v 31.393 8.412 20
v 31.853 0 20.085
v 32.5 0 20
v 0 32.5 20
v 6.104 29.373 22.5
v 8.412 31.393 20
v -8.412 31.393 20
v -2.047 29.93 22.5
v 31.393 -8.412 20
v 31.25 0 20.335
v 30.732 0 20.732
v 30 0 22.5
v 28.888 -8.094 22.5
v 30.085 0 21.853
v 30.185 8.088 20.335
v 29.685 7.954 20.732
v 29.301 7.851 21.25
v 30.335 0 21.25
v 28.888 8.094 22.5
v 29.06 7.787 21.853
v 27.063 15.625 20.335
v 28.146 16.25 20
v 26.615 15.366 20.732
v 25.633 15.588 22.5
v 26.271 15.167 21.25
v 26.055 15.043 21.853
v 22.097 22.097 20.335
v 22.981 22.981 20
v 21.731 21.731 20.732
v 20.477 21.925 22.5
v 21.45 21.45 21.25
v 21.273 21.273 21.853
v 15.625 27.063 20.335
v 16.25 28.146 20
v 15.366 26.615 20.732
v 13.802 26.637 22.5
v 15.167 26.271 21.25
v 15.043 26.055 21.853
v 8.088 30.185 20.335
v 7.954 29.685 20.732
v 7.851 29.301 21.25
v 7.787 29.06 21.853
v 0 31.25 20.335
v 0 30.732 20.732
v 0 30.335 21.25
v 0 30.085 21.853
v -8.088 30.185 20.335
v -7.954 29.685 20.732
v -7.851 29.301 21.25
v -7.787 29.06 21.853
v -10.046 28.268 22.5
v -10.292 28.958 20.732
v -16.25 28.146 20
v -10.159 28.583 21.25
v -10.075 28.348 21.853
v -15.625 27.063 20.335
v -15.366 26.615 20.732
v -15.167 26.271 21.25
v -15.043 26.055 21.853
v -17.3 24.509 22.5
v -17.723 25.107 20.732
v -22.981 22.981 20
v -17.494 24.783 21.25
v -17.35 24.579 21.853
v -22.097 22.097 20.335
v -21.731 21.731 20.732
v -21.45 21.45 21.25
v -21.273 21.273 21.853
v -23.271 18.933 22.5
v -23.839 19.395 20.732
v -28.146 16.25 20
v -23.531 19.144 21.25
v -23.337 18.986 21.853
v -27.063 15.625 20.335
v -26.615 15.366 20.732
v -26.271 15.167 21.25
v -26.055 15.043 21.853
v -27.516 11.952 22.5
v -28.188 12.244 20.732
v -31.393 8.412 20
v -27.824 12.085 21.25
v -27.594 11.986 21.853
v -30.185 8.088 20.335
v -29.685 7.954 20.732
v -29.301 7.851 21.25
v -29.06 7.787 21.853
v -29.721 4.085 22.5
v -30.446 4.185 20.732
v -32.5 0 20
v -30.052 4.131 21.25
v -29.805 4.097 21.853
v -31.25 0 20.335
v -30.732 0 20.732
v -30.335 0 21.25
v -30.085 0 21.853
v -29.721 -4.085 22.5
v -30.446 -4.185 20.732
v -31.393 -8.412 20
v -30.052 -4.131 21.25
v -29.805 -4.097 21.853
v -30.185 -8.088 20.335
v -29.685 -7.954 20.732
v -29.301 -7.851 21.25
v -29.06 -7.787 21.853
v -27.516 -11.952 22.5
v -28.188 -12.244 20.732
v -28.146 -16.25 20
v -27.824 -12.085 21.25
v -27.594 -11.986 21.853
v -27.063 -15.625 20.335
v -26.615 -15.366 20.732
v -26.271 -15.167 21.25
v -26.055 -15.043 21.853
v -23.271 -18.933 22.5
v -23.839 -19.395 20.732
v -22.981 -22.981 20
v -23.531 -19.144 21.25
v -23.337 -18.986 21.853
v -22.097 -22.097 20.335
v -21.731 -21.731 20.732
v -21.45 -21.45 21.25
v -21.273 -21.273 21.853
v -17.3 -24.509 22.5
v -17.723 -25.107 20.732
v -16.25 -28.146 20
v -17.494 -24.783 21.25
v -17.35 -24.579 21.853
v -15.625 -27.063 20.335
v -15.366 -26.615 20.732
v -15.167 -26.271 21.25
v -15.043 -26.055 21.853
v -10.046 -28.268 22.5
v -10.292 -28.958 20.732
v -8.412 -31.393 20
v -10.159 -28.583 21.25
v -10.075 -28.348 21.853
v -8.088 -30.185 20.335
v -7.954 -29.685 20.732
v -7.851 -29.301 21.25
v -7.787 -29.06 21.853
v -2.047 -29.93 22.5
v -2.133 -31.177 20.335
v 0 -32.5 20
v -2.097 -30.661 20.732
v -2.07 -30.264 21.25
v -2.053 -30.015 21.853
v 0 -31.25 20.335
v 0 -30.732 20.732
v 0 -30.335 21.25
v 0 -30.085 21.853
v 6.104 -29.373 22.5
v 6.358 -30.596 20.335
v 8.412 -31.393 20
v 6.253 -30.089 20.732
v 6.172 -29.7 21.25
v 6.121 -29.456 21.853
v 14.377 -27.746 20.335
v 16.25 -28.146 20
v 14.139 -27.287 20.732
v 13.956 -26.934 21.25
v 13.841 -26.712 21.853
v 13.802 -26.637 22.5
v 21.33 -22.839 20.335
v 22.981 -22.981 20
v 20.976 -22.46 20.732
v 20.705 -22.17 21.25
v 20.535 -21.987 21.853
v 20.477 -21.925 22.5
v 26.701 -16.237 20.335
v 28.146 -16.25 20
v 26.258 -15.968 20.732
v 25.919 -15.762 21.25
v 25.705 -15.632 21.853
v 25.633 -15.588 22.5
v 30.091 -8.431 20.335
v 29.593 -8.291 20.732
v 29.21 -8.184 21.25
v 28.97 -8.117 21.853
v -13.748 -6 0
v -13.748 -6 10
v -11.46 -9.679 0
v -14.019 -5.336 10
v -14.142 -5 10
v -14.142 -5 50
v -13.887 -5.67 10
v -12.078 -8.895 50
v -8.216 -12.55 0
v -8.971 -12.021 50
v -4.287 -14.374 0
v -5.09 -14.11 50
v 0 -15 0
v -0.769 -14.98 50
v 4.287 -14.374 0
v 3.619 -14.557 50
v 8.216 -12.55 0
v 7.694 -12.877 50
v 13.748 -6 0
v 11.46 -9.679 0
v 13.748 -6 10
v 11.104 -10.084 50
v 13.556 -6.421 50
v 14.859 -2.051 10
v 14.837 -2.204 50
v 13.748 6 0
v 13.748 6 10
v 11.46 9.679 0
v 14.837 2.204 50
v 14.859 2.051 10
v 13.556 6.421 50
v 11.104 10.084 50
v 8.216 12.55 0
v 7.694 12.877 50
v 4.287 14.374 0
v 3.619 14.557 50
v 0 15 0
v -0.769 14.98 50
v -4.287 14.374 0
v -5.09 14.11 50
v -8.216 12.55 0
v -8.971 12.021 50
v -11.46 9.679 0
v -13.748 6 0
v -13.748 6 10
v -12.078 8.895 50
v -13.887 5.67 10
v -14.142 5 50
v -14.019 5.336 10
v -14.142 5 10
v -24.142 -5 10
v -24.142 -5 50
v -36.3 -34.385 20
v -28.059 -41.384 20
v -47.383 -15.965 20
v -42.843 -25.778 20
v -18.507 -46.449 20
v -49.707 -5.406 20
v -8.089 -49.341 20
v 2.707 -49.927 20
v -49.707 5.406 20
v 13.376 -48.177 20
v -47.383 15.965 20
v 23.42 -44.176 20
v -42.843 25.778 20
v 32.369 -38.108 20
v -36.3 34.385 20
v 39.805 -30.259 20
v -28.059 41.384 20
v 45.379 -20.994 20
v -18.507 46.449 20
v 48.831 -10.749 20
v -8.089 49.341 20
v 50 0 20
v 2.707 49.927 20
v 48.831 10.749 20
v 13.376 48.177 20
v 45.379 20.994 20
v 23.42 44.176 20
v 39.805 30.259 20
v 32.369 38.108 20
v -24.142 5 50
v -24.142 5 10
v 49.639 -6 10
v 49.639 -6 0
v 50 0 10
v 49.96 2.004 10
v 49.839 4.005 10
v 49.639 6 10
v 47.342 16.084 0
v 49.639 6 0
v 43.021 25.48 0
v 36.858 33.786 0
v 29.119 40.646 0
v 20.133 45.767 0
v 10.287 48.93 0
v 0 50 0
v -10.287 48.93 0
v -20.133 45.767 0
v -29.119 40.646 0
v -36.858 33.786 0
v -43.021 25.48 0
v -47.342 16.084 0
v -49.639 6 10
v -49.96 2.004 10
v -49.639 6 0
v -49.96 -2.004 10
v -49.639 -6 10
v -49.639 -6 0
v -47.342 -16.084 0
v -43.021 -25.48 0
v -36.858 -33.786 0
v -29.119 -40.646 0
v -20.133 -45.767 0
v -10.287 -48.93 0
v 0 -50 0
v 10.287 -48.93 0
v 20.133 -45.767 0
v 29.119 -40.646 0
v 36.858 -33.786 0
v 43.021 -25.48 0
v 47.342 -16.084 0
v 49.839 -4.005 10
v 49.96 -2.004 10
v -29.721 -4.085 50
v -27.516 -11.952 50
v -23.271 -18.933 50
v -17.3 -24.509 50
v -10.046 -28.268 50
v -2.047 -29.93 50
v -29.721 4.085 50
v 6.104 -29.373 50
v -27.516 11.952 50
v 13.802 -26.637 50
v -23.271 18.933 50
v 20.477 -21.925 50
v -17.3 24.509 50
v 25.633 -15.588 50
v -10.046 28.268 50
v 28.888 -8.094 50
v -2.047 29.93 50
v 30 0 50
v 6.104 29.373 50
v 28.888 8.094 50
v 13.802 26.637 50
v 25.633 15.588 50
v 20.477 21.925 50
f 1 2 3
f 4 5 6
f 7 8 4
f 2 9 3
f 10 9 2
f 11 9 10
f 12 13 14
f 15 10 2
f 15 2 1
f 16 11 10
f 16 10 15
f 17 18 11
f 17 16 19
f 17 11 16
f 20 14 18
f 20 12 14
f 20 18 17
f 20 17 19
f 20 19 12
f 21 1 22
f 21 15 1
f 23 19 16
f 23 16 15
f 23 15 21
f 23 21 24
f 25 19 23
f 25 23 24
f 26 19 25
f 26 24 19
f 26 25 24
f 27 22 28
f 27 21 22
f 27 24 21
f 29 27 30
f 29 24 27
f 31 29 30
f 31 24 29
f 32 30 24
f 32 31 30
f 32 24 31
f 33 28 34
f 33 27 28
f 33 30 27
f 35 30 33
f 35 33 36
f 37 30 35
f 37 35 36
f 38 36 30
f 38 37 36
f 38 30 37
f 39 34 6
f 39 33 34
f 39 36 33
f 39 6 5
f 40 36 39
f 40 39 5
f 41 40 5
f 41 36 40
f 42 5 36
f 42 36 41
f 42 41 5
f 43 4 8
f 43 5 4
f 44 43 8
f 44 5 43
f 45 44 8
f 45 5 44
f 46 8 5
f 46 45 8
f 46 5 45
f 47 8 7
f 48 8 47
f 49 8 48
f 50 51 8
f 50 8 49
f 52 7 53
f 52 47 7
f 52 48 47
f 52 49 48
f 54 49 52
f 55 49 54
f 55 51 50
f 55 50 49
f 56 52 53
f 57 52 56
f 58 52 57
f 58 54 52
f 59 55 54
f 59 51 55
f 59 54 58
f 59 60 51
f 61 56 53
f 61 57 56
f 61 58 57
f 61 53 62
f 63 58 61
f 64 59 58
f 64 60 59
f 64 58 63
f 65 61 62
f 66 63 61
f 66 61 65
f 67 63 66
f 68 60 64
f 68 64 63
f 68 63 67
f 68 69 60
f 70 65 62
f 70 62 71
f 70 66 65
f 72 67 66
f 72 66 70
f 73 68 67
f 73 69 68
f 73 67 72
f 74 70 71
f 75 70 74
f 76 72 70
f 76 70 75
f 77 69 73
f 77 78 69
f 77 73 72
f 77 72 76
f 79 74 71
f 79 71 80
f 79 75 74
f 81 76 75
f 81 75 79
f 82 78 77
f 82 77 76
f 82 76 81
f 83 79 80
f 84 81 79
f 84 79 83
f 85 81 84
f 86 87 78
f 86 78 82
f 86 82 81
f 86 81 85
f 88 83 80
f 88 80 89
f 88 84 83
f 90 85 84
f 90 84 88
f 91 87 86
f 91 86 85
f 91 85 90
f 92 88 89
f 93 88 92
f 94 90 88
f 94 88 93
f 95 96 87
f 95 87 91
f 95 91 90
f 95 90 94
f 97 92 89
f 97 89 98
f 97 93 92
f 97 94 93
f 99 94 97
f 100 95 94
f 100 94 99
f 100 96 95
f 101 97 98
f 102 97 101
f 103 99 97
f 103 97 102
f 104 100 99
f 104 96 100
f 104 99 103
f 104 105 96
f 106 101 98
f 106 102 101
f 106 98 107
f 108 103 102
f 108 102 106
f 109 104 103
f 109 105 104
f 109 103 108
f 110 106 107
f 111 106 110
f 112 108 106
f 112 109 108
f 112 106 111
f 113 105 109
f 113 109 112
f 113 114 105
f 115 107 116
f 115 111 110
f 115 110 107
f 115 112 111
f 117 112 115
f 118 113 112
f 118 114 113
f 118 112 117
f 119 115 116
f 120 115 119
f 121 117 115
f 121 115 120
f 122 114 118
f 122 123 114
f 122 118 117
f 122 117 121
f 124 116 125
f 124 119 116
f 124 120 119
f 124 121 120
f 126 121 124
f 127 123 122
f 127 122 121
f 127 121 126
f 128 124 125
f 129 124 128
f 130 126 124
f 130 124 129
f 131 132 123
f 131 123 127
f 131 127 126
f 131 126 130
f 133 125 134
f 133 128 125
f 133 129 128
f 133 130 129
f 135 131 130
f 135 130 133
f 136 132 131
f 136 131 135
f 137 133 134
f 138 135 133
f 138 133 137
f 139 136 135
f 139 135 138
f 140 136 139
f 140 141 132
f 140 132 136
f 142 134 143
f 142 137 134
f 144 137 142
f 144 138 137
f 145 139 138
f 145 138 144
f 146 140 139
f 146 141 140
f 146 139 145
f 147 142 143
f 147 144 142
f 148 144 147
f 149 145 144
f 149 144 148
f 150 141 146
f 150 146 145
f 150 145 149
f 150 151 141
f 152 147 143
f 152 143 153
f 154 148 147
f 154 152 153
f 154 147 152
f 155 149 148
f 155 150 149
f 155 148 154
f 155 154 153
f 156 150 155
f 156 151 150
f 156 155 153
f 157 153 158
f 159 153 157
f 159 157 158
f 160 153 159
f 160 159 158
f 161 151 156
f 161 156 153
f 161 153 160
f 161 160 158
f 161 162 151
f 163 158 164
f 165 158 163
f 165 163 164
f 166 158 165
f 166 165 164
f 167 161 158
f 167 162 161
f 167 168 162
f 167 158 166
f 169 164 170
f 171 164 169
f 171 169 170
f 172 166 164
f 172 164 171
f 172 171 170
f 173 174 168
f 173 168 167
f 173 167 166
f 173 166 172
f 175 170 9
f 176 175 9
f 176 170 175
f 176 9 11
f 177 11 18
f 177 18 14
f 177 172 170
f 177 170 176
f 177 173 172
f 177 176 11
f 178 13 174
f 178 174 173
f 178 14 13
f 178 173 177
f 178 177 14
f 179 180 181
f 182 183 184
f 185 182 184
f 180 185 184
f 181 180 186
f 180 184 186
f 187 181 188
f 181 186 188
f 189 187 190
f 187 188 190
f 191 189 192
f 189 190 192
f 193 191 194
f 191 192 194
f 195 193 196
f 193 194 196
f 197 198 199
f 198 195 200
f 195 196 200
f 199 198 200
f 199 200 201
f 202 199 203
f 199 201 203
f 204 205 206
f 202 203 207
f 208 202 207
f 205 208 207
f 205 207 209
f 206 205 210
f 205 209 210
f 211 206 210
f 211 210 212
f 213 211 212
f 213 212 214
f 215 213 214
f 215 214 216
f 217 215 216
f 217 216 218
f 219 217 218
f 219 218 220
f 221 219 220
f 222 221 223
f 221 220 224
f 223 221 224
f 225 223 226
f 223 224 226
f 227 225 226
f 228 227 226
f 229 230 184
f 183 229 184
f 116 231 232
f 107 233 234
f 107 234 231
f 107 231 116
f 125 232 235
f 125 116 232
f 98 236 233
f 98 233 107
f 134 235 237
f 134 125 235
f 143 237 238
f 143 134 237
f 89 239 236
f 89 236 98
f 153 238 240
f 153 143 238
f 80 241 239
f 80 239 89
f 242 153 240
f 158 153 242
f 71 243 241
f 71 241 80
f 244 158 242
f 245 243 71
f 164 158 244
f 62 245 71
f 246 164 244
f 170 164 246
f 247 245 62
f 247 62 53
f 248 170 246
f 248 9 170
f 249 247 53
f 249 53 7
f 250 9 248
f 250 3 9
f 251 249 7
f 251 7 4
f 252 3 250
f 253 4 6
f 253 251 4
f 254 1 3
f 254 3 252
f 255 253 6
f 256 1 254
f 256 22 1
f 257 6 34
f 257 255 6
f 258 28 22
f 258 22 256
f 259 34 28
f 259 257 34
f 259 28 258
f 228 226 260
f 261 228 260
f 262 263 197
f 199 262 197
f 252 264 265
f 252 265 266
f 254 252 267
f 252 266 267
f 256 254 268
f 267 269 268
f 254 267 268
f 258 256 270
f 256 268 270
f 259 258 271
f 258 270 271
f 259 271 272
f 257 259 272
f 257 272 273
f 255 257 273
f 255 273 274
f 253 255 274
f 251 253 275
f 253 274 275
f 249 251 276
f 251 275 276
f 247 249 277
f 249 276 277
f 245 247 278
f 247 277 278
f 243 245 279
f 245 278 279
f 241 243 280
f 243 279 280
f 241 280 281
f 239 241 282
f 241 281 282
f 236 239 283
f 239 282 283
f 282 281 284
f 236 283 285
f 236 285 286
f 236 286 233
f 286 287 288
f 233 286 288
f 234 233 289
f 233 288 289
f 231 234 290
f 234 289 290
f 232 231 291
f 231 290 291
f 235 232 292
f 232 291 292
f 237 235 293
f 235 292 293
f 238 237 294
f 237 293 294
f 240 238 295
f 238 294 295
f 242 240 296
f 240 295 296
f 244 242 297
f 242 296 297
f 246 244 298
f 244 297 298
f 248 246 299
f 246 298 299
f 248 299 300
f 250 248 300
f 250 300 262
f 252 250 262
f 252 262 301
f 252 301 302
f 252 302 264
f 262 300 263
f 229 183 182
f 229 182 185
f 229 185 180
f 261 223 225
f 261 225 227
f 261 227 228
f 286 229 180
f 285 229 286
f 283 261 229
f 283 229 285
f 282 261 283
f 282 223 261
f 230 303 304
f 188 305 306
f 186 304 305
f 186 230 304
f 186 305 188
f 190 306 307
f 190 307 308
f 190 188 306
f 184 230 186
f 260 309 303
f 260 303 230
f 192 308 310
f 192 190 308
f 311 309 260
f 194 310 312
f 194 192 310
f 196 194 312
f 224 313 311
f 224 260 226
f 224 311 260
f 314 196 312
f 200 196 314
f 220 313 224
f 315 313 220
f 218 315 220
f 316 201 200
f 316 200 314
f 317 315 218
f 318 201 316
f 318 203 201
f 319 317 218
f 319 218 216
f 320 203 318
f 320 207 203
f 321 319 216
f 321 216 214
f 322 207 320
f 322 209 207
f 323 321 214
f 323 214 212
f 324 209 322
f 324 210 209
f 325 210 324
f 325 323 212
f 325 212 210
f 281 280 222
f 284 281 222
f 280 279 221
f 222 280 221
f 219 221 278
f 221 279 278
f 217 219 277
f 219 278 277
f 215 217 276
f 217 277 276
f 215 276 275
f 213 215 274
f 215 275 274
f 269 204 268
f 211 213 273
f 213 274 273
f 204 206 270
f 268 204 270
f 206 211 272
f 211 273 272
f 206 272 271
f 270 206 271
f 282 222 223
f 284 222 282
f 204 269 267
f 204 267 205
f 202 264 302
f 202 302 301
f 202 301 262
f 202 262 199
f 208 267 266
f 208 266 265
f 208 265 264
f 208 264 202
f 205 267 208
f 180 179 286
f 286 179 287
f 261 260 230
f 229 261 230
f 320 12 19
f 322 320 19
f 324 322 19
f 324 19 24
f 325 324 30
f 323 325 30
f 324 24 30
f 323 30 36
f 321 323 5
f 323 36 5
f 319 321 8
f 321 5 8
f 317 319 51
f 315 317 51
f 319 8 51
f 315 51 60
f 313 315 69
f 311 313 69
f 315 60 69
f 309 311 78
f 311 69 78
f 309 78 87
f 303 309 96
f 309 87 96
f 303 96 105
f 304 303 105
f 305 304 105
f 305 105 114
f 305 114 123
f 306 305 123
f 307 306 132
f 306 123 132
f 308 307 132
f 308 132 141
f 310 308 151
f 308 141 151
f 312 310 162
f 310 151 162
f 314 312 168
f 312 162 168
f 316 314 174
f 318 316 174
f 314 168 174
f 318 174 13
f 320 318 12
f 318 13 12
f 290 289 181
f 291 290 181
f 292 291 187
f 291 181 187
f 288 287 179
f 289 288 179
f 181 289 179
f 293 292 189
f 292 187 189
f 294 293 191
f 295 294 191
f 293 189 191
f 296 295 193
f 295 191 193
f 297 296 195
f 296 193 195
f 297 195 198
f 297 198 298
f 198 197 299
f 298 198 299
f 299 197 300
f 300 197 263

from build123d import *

# Parameters (mm, degrees)
SKETCH2_R           = 50
BOSS_EXTRUDE1_DEPTH = 20
SKETCH3_R           = 30
BOSS_EXTRUDE2_DEPTH = 30
FILLET1_R           = 2.5
SKETCH4_W           = 110
SKETCH4_H           = 12
CUT_EXTRUDE1_DEPTH  = 10
CUT_EXTRUDE2_REACH  = 88.603


with BuildPart() as part:
    # Sketch2 → Boss-Extrude1 (new body)
    with BuildSketch(Plane.XY):
        Circle(SKETCH2_R)
    extrude(amount=BOSS_EXTRUDE1_DEPTH)

    # Sketch3 → Boss-Extrude2 (add)
    with BuildSketch(Plane.XY.offset(20)):
        Circle(SKETCH3_R)
    extrude(amount=BOSS_EXTRUDE2_DEPTH)

    # Fillet1
    fillet1_edges = [part.edges().sort_by_distance(p)[0] for p in [
        (-30, 0, 20),
    ]]
    fillet(fillet1_edges, radius=FILLET1_R)

    # Sketch4 → Cut-Extrude1 (cut)
    with BuildSketch(Plane(origin=(0, 0, 0), x_dir=(-1, 0, 0), z_dir=(0, 0, -1))):
        Rectangle(SKETCH4_W, SKETCH4_H)
    extrude(amount=-CUT_EXTRUDE1_DEPTH, mode=Mode.SUBTRACT)

    # Cut-Extrude2: up to this face of the body (flat: up to its plane)
    cut_extrude2_end = Plane(part.part.faces().sort_by_distance((0, 24.497956202, 0))[0])
    # Sketch5 → Cut-Extrude2 (cut, up to the picked face)
    with BuildSketch(Plane.XY.offset(50), mode=Mode.PRIVATE) as cut_extrude2_sk1:
        with BuildLine():
            Line((-14.142135624, 5), (-24.142135624, 5))
            Line((-24.142135624, 5), (-24.142135624, -5))
            Line((-24.142135624, -5), (-14.142135624, -5))
            ThreePointArc((-14.142135624, -5), (15, 0), (-14.142135624, 5))
        make_face()
    cut_extrude2_tool1 = split(extrude(cut_extrude2_sk1.sketch, amount=-CUT_EXTRUDE2_REACH, mode=Mode.PRIVATE), bisect_by=cut_extrude2_end, keep=Keep.BOTH, mode=Mode.PRIVATE)
    add(cut_extrude2_tool1.solids().sort_by(Axis((-2.285441, 0, 50), (0, 0, -1)))[0], mode=Mode.SUBTRACT)


solid = part.part
